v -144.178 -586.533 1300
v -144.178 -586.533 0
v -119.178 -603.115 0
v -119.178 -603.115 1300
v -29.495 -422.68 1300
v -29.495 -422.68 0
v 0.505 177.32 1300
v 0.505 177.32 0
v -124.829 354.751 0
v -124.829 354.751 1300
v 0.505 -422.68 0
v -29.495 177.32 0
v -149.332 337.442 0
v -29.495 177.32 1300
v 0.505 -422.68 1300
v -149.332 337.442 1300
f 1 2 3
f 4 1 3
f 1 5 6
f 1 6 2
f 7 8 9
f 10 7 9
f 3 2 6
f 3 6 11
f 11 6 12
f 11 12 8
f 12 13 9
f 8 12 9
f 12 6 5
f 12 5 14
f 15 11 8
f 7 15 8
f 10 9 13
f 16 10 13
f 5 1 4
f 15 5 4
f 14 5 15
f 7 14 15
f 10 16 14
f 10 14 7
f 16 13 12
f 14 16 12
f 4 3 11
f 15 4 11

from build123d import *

# Parameters (mm, degrees)
F0_W     = 30
F0_H     = 600
F1_DEPTH = 1300


with BuildPart() as f1:
    # F0 (on Top) → F1 (new body)
    with BuildSketch(Plane.XY):
        with Locations((-14.494546, -122.679873)):
            Rectangle(F0_W, F0_H)
        Polygon((-29.494546, 177.320127), (0.505454, 177.320127), (-124.828876, 354.750561), (-149.332099, 337.441833), align=None)
        Polygon((-119.177751, -603.115286), (0.505454, -422.679873), (-29.494546, -422.679873), (-144.178013, -586.532557), align=None)
    extrude(amount=F1_DEPTH)


solid = f1.part
